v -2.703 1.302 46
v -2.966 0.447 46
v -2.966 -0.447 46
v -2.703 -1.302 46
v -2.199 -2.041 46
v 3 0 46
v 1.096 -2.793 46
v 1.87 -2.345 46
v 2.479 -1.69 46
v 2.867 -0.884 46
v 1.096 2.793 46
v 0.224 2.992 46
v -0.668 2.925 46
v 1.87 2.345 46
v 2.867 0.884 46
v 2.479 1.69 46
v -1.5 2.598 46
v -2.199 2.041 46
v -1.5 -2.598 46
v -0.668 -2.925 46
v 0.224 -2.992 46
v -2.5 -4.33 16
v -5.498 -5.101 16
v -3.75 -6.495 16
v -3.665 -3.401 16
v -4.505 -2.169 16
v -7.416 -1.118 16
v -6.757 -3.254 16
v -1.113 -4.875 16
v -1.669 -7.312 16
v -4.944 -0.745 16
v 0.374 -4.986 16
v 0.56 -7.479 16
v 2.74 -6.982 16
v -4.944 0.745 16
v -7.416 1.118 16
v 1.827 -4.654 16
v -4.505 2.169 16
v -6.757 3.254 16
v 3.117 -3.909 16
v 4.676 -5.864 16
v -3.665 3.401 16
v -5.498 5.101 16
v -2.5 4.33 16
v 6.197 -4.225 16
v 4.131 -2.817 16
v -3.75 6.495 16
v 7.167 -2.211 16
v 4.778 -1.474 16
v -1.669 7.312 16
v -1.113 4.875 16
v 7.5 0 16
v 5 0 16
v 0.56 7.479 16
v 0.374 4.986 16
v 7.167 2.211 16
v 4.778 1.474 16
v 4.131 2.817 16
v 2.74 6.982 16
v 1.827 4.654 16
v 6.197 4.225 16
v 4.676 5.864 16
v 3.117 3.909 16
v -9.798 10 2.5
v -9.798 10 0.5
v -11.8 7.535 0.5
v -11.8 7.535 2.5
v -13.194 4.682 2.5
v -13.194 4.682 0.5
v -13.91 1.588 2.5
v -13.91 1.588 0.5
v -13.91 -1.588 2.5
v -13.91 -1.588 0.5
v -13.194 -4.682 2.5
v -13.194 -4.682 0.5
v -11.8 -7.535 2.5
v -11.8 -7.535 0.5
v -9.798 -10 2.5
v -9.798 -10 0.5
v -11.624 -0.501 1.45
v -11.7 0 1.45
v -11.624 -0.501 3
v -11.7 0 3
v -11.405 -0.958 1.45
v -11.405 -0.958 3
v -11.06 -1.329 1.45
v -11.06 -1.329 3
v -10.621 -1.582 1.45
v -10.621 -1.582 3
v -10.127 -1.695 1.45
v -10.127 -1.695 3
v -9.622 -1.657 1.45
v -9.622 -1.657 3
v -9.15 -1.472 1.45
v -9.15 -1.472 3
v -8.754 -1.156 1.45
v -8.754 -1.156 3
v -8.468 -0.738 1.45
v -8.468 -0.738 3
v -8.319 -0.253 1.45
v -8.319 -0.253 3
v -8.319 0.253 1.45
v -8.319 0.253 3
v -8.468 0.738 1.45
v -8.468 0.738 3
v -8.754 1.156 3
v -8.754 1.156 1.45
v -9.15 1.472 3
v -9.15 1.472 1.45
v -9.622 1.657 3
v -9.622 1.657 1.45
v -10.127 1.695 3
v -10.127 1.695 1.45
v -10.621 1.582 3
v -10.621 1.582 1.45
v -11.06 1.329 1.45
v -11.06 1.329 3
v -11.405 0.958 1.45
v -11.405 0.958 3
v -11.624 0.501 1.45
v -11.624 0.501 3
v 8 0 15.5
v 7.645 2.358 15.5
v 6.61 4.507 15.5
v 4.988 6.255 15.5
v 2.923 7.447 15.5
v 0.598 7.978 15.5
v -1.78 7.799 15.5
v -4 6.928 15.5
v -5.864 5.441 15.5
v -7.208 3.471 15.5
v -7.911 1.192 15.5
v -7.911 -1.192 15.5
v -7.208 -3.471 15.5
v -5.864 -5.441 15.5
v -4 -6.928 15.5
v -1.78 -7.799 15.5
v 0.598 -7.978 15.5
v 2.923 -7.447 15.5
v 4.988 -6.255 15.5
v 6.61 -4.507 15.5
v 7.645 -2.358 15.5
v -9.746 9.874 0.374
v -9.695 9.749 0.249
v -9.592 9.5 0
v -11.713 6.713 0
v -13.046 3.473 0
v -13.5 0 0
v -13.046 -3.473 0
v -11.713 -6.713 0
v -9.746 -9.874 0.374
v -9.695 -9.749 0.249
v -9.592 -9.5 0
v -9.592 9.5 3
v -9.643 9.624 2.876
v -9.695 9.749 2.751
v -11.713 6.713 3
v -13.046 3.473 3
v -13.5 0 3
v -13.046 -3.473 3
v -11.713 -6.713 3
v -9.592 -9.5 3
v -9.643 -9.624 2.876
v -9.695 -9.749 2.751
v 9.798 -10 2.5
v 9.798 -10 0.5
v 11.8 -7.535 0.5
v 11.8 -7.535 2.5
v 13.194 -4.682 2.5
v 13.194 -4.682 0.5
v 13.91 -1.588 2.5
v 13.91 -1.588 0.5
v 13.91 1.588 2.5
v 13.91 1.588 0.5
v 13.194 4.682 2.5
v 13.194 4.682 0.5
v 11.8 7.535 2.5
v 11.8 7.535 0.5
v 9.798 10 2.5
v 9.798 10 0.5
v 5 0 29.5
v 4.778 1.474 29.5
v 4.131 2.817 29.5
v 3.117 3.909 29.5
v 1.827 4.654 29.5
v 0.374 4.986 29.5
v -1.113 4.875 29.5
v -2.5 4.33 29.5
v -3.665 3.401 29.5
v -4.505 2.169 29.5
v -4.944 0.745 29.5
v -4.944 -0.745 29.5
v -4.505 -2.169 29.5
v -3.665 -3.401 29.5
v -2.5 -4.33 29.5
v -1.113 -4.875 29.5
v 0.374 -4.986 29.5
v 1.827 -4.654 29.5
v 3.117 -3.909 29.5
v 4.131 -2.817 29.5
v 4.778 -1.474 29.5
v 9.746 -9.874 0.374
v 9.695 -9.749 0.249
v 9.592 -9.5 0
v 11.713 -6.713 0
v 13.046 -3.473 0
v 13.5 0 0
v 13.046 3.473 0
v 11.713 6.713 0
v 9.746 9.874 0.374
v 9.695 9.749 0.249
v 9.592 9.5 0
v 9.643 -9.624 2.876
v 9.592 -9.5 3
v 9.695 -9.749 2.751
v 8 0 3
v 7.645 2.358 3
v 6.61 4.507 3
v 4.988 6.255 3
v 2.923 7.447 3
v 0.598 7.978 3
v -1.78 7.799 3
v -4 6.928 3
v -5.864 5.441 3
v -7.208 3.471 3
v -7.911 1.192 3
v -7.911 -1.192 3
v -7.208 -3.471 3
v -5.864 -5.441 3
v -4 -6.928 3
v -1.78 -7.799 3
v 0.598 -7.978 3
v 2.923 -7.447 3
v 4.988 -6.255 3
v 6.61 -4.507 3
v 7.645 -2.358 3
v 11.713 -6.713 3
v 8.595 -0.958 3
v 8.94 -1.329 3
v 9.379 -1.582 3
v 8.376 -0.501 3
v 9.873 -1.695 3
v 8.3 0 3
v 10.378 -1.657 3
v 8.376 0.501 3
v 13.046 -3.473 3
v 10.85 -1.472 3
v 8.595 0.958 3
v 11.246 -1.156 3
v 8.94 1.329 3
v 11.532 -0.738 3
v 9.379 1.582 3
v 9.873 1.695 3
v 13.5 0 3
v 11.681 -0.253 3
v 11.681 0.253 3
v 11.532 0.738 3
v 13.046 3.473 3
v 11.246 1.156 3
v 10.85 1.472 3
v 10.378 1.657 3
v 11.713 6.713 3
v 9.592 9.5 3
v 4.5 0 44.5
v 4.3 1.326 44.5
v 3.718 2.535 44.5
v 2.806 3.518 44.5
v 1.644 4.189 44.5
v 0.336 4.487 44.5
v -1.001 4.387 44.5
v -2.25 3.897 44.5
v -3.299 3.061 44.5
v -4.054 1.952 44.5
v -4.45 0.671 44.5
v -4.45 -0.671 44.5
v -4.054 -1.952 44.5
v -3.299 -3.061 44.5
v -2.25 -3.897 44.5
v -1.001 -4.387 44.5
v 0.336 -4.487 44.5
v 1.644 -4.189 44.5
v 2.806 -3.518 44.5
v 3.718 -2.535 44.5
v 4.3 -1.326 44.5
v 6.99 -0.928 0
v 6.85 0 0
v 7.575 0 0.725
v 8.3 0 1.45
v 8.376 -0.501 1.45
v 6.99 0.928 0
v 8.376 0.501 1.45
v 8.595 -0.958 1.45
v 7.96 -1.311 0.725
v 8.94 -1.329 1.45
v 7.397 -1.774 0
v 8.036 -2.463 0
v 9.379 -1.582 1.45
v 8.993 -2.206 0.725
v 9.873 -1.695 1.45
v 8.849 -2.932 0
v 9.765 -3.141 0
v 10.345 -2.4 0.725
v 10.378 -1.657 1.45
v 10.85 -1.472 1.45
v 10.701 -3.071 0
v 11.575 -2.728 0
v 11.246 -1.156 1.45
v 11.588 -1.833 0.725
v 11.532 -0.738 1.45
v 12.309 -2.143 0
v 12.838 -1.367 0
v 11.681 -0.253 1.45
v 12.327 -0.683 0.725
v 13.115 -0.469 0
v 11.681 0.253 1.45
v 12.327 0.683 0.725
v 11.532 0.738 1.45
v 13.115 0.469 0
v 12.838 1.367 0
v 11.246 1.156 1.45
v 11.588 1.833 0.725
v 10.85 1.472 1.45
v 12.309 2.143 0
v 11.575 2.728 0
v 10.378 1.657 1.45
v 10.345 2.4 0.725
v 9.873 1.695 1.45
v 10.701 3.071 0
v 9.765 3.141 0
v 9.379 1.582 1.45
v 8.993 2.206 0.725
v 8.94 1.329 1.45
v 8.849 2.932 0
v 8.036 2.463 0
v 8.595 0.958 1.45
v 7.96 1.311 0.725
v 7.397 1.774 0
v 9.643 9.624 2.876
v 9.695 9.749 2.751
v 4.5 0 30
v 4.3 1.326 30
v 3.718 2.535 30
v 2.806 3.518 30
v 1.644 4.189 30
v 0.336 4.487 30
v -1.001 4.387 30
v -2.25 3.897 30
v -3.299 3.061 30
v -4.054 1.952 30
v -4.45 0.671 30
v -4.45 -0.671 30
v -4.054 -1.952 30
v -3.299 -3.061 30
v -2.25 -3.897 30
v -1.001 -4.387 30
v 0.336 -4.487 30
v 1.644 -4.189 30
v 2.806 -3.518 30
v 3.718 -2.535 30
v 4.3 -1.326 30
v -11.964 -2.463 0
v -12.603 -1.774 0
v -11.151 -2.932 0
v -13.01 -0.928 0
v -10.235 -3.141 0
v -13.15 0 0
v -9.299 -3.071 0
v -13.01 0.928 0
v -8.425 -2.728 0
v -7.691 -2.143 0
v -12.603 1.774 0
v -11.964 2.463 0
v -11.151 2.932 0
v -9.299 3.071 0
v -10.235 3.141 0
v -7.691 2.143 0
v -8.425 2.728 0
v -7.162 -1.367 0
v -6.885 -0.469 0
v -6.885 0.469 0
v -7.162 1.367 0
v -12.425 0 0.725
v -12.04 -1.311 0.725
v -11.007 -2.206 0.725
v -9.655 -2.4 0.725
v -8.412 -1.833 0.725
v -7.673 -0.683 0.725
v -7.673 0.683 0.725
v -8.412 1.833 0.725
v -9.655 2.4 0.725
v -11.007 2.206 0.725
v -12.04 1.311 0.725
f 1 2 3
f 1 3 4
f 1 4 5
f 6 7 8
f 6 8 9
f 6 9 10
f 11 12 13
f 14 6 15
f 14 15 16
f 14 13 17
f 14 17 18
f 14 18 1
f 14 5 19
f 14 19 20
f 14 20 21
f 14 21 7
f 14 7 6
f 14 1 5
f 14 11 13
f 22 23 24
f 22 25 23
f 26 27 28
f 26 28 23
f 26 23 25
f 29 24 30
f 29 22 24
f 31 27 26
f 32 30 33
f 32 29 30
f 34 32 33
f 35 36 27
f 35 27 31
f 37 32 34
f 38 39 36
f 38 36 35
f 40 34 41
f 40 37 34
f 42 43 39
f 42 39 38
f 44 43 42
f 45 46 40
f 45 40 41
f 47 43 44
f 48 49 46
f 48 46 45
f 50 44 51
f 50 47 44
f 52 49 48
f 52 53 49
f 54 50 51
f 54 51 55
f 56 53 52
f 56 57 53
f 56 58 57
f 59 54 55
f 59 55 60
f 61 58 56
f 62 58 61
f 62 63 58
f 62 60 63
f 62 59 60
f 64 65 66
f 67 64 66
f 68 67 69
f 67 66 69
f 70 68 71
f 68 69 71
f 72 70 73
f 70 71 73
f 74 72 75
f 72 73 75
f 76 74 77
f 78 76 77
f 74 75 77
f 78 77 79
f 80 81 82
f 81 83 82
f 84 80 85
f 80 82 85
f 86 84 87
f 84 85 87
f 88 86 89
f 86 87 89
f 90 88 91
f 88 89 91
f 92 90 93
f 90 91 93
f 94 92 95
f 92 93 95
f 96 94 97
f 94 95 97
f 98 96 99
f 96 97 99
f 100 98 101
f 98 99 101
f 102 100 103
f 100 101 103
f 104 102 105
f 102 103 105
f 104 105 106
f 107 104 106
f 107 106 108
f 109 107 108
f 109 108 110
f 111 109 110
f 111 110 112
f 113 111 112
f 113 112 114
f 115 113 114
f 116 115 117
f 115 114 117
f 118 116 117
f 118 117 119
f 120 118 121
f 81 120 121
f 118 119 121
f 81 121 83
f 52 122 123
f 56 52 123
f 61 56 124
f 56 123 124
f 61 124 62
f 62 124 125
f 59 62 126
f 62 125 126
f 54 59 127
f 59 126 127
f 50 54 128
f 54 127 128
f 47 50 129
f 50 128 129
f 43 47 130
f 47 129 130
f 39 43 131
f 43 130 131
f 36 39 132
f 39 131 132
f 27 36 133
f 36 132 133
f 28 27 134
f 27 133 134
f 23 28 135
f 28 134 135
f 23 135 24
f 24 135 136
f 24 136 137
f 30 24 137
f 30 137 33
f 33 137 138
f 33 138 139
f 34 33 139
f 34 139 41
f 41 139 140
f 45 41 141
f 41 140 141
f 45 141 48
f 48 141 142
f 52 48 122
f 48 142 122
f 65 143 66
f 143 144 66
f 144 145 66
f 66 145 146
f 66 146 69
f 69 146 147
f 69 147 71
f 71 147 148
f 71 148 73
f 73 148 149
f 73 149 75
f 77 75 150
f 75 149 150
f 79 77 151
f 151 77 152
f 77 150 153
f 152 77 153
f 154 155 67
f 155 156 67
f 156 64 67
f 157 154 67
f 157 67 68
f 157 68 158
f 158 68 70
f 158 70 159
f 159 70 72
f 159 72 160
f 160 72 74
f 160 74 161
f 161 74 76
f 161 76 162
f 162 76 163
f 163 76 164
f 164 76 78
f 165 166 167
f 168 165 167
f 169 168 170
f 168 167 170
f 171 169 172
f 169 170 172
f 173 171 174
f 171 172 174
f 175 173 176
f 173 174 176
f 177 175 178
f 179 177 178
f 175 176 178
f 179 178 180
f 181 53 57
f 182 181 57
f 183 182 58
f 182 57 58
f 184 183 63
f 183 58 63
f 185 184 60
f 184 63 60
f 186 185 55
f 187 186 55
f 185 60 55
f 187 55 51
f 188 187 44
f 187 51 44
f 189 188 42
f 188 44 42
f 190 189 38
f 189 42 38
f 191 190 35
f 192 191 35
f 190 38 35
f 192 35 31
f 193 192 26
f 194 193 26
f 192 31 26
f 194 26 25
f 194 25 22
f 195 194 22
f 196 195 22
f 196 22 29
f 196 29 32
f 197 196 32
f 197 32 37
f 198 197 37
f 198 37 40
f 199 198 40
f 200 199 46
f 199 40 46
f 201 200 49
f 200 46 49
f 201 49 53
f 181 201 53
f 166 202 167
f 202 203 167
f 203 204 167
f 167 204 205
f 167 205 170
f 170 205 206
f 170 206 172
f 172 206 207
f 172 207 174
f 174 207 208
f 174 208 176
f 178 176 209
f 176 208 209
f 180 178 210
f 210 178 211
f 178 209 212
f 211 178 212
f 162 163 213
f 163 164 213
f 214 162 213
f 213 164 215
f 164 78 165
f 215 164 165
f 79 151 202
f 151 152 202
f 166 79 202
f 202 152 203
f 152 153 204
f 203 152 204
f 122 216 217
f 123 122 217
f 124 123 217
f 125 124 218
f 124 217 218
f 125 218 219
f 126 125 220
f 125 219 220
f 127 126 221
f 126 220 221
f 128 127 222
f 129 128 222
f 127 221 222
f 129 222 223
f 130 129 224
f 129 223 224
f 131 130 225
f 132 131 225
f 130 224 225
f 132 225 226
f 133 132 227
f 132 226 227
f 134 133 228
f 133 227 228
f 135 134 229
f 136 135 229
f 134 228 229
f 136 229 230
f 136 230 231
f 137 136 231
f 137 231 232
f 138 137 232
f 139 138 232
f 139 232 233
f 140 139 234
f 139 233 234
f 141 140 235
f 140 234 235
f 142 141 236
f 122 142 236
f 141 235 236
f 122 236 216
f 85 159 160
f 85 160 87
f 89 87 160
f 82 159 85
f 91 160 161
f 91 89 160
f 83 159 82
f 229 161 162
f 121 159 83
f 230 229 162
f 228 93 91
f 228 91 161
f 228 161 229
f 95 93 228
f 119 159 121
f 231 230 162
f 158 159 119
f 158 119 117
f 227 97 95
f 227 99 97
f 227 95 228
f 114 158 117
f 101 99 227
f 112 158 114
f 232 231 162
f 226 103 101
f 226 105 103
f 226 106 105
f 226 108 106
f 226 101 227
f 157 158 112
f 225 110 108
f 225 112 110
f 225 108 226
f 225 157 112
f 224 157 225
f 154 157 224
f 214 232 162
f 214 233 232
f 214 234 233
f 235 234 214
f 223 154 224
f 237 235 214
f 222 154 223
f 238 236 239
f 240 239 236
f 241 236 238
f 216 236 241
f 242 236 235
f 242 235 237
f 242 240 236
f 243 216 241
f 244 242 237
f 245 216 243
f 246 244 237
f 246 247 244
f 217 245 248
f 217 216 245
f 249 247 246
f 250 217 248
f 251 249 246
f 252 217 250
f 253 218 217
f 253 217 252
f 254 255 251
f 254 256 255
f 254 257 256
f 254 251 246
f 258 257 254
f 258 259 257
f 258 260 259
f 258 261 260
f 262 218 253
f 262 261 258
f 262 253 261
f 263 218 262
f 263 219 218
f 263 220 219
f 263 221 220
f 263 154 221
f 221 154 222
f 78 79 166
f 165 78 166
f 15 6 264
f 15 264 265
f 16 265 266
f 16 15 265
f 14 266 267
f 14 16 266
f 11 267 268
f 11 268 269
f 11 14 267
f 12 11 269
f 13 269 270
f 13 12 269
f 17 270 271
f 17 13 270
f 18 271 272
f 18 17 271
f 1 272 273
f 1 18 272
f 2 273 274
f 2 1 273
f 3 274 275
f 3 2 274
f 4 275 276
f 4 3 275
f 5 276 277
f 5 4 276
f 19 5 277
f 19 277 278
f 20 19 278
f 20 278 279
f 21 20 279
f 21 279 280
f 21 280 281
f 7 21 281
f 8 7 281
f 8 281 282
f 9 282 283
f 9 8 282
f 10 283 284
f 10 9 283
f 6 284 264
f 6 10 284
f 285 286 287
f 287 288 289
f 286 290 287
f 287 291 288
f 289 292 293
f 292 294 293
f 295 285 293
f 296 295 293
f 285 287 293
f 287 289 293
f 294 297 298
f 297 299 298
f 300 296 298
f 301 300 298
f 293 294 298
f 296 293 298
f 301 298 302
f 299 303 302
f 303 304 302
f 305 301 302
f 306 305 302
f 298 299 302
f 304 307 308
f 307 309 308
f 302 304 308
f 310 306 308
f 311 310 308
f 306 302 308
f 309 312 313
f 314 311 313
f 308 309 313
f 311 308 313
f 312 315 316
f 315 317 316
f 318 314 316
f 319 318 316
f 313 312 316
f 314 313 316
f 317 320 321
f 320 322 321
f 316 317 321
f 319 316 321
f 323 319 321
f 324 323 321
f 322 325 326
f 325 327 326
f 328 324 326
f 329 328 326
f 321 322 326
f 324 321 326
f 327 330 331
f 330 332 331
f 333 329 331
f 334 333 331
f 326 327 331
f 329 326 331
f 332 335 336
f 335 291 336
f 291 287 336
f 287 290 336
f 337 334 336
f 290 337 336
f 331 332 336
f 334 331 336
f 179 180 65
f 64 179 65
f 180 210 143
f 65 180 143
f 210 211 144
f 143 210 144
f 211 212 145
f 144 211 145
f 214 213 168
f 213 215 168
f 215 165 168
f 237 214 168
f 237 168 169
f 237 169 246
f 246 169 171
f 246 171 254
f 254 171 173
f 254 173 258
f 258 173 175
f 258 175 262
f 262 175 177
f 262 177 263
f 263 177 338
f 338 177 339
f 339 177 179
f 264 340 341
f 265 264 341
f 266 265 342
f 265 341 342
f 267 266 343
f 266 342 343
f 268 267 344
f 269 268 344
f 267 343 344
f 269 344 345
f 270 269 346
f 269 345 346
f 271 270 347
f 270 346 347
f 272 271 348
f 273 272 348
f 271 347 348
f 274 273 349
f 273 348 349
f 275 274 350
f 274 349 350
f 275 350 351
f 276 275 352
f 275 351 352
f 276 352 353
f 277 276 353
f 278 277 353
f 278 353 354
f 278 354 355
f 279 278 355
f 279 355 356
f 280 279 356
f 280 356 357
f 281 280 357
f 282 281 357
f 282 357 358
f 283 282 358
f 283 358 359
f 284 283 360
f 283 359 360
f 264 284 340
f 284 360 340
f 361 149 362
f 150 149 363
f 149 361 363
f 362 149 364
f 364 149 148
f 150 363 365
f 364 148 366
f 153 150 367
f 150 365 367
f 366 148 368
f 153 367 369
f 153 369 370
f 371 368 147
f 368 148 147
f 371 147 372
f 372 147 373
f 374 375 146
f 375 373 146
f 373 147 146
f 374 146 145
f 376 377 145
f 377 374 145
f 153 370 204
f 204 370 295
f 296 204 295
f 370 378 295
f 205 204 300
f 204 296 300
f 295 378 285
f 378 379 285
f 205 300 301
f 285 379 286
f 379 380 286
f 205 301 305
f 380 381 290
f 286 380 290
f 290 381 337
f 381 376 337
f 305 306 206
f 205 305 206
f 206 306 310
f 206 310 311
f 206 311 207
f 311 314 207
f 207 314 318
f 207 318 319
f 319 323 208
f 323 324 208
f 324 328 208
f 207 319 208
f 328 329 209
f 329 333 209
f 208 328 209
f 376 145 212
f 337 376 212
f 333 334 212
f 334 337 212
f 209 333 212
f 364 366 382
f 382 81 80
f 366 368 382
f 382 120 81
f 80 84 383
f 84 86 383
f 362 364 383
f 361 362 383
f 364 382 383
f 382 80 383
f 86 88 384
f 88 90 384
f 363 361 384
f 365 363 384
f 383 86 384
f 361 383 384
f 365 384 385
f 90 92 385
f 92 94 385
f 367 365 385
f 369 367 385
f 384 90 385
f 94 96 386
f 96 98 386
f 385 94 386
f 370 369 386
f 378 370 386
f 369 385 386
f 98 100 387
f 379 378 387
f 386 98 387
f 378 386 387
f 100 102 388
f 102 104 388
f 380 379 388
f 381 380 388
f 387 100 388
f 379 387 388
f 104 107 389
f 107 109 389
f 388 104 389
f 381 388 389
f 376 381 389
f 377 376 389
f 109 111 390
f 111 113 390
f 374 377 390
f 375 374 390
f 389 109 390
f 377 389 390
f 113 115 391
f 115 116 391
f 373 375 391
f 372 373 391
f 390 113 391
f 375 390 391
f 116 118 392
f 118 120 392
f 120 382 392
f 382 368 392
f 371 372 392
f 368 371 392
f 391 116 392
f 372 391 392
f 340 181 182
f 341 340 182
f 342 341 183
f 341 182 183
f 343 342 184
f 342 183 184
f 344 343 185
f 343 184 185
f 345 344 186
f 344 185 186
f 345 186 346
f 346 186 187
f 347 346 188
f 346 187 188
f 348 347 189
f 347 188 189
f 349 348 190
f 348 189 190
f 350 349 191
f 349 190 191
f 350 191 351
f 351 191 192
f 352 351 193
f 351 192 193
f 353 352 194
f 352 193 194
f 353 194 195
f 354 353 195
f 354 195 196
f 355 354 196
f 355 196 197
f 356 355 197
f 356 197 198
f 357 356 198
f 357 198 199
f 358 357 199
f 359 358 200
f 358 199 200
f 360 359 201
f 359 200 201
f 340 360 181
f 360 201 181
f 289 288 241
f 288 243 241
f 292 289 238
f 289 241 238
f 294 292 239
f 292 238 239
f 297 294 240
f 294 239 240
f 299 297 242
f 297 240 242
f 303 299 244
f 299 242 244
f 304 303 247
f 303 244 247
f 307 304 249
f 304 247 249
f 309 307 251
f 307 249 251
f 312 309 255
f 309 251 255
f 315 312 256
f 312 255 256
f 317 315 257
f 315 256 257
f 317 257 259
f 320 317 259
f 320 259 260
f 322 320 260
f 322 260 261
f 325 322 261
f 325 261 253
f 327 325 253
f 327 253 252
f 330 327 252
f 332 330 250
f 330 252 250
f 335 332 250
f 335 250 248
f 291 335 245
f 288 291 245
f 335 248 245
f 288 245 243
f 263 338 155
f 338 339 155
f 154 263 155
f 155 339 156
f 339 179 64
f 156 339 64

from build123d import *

# Parameters (mm, degrees)
F1_DEPTH       = 3
F2_D           = 3.4
F2_CSINK_D     = 6.3
F2_CSINK_ANGLE = 90
F3_R           = 8
F4_DEPTH       = 13
F5_R           = 5
F6_DEPTH       = 14
F7_R           = 4.5
F8_DEPTH       = 16
F9_SIZE        = 1.5
F10_SIZE       = 0.49999


# Not quite as in the source:
# - a fillet or chamfer is up to 0.001 mm smaller than in the source, because OpenCascade refuses the exact size


with BuildPart() as f1:
    # F0 (on Top) → F1 (new body)
    with BuildSketch(Plane.XY):
        with BuildLine():
            Line((9.7979589711, 10), (-9.7979589711, 10))
            ThreePointArc((-9.7979589711, 10), (-14, 0), (-9.7979589711, -10))
            Line((-9.7979589711, -10), (9.7979589711, -10))
            ThreePointArc((9.7979589711, -10), (14, 0), (9.7979589711, 10))
        make_face()
    extrude(amount=F1_DEPTH)

    # F2 (through all)
    with Locations(Plane(origin=(0, 0, 0), x_dir=(1, 0, 0), z_dir=(0, 0, -1))):
        with Locations((-10, 0), (10, 0)):
            CounterSinkHole(F2_D / 2, F2_CSINK_D / 2, counter_sink_angle=F2_CSINK_ANGLE)

    # F3 (on face) → F4 (join)
    with BuildSketch(Plane.XY.offset(3)):
        Circle(F3_R)
    extrude(amount=F4_DEPTH)

    # F5 (on face) → F6 (join)
    with BuildSketch(Plane.XY.offset(16)):
        Circle(F5_R)
    extrude(amount=F6_DEPTH)

    # F7 (on face) → F8 (join)
    with BuildSketch(Plane.XY.offset(30)):
        Circle(F7_R)
    extrude(amount=F8_DEPTH)

    # F9
    f9_edges = [f1.edges().sort_by_distance(p)[0] for p in [
        (-4.5, 0, 46),
    ]]
    chamfer(f9_edges, length=F9_SIZE)

    # F10 (size 0.5 in the source; OpenCascade refuses exactly that, so slightly less here)
    f10_edges = [f1.edges().sort_by_distance(p)[0] for p in [
        (-5, 0, 30),
        (0, -10, 3),
        (14, 0, 3),
        (0, 10, 3),
        (-14, 0, 3),
        (-14, 0, 0),
        (0, -10, 0),
        (14, 0, 0),
        (0, 10, 0),
        (-8, 0, 16),
    ]]
    chamfer(f10_edges, length=F10_SIZE)


solid = f1.part
